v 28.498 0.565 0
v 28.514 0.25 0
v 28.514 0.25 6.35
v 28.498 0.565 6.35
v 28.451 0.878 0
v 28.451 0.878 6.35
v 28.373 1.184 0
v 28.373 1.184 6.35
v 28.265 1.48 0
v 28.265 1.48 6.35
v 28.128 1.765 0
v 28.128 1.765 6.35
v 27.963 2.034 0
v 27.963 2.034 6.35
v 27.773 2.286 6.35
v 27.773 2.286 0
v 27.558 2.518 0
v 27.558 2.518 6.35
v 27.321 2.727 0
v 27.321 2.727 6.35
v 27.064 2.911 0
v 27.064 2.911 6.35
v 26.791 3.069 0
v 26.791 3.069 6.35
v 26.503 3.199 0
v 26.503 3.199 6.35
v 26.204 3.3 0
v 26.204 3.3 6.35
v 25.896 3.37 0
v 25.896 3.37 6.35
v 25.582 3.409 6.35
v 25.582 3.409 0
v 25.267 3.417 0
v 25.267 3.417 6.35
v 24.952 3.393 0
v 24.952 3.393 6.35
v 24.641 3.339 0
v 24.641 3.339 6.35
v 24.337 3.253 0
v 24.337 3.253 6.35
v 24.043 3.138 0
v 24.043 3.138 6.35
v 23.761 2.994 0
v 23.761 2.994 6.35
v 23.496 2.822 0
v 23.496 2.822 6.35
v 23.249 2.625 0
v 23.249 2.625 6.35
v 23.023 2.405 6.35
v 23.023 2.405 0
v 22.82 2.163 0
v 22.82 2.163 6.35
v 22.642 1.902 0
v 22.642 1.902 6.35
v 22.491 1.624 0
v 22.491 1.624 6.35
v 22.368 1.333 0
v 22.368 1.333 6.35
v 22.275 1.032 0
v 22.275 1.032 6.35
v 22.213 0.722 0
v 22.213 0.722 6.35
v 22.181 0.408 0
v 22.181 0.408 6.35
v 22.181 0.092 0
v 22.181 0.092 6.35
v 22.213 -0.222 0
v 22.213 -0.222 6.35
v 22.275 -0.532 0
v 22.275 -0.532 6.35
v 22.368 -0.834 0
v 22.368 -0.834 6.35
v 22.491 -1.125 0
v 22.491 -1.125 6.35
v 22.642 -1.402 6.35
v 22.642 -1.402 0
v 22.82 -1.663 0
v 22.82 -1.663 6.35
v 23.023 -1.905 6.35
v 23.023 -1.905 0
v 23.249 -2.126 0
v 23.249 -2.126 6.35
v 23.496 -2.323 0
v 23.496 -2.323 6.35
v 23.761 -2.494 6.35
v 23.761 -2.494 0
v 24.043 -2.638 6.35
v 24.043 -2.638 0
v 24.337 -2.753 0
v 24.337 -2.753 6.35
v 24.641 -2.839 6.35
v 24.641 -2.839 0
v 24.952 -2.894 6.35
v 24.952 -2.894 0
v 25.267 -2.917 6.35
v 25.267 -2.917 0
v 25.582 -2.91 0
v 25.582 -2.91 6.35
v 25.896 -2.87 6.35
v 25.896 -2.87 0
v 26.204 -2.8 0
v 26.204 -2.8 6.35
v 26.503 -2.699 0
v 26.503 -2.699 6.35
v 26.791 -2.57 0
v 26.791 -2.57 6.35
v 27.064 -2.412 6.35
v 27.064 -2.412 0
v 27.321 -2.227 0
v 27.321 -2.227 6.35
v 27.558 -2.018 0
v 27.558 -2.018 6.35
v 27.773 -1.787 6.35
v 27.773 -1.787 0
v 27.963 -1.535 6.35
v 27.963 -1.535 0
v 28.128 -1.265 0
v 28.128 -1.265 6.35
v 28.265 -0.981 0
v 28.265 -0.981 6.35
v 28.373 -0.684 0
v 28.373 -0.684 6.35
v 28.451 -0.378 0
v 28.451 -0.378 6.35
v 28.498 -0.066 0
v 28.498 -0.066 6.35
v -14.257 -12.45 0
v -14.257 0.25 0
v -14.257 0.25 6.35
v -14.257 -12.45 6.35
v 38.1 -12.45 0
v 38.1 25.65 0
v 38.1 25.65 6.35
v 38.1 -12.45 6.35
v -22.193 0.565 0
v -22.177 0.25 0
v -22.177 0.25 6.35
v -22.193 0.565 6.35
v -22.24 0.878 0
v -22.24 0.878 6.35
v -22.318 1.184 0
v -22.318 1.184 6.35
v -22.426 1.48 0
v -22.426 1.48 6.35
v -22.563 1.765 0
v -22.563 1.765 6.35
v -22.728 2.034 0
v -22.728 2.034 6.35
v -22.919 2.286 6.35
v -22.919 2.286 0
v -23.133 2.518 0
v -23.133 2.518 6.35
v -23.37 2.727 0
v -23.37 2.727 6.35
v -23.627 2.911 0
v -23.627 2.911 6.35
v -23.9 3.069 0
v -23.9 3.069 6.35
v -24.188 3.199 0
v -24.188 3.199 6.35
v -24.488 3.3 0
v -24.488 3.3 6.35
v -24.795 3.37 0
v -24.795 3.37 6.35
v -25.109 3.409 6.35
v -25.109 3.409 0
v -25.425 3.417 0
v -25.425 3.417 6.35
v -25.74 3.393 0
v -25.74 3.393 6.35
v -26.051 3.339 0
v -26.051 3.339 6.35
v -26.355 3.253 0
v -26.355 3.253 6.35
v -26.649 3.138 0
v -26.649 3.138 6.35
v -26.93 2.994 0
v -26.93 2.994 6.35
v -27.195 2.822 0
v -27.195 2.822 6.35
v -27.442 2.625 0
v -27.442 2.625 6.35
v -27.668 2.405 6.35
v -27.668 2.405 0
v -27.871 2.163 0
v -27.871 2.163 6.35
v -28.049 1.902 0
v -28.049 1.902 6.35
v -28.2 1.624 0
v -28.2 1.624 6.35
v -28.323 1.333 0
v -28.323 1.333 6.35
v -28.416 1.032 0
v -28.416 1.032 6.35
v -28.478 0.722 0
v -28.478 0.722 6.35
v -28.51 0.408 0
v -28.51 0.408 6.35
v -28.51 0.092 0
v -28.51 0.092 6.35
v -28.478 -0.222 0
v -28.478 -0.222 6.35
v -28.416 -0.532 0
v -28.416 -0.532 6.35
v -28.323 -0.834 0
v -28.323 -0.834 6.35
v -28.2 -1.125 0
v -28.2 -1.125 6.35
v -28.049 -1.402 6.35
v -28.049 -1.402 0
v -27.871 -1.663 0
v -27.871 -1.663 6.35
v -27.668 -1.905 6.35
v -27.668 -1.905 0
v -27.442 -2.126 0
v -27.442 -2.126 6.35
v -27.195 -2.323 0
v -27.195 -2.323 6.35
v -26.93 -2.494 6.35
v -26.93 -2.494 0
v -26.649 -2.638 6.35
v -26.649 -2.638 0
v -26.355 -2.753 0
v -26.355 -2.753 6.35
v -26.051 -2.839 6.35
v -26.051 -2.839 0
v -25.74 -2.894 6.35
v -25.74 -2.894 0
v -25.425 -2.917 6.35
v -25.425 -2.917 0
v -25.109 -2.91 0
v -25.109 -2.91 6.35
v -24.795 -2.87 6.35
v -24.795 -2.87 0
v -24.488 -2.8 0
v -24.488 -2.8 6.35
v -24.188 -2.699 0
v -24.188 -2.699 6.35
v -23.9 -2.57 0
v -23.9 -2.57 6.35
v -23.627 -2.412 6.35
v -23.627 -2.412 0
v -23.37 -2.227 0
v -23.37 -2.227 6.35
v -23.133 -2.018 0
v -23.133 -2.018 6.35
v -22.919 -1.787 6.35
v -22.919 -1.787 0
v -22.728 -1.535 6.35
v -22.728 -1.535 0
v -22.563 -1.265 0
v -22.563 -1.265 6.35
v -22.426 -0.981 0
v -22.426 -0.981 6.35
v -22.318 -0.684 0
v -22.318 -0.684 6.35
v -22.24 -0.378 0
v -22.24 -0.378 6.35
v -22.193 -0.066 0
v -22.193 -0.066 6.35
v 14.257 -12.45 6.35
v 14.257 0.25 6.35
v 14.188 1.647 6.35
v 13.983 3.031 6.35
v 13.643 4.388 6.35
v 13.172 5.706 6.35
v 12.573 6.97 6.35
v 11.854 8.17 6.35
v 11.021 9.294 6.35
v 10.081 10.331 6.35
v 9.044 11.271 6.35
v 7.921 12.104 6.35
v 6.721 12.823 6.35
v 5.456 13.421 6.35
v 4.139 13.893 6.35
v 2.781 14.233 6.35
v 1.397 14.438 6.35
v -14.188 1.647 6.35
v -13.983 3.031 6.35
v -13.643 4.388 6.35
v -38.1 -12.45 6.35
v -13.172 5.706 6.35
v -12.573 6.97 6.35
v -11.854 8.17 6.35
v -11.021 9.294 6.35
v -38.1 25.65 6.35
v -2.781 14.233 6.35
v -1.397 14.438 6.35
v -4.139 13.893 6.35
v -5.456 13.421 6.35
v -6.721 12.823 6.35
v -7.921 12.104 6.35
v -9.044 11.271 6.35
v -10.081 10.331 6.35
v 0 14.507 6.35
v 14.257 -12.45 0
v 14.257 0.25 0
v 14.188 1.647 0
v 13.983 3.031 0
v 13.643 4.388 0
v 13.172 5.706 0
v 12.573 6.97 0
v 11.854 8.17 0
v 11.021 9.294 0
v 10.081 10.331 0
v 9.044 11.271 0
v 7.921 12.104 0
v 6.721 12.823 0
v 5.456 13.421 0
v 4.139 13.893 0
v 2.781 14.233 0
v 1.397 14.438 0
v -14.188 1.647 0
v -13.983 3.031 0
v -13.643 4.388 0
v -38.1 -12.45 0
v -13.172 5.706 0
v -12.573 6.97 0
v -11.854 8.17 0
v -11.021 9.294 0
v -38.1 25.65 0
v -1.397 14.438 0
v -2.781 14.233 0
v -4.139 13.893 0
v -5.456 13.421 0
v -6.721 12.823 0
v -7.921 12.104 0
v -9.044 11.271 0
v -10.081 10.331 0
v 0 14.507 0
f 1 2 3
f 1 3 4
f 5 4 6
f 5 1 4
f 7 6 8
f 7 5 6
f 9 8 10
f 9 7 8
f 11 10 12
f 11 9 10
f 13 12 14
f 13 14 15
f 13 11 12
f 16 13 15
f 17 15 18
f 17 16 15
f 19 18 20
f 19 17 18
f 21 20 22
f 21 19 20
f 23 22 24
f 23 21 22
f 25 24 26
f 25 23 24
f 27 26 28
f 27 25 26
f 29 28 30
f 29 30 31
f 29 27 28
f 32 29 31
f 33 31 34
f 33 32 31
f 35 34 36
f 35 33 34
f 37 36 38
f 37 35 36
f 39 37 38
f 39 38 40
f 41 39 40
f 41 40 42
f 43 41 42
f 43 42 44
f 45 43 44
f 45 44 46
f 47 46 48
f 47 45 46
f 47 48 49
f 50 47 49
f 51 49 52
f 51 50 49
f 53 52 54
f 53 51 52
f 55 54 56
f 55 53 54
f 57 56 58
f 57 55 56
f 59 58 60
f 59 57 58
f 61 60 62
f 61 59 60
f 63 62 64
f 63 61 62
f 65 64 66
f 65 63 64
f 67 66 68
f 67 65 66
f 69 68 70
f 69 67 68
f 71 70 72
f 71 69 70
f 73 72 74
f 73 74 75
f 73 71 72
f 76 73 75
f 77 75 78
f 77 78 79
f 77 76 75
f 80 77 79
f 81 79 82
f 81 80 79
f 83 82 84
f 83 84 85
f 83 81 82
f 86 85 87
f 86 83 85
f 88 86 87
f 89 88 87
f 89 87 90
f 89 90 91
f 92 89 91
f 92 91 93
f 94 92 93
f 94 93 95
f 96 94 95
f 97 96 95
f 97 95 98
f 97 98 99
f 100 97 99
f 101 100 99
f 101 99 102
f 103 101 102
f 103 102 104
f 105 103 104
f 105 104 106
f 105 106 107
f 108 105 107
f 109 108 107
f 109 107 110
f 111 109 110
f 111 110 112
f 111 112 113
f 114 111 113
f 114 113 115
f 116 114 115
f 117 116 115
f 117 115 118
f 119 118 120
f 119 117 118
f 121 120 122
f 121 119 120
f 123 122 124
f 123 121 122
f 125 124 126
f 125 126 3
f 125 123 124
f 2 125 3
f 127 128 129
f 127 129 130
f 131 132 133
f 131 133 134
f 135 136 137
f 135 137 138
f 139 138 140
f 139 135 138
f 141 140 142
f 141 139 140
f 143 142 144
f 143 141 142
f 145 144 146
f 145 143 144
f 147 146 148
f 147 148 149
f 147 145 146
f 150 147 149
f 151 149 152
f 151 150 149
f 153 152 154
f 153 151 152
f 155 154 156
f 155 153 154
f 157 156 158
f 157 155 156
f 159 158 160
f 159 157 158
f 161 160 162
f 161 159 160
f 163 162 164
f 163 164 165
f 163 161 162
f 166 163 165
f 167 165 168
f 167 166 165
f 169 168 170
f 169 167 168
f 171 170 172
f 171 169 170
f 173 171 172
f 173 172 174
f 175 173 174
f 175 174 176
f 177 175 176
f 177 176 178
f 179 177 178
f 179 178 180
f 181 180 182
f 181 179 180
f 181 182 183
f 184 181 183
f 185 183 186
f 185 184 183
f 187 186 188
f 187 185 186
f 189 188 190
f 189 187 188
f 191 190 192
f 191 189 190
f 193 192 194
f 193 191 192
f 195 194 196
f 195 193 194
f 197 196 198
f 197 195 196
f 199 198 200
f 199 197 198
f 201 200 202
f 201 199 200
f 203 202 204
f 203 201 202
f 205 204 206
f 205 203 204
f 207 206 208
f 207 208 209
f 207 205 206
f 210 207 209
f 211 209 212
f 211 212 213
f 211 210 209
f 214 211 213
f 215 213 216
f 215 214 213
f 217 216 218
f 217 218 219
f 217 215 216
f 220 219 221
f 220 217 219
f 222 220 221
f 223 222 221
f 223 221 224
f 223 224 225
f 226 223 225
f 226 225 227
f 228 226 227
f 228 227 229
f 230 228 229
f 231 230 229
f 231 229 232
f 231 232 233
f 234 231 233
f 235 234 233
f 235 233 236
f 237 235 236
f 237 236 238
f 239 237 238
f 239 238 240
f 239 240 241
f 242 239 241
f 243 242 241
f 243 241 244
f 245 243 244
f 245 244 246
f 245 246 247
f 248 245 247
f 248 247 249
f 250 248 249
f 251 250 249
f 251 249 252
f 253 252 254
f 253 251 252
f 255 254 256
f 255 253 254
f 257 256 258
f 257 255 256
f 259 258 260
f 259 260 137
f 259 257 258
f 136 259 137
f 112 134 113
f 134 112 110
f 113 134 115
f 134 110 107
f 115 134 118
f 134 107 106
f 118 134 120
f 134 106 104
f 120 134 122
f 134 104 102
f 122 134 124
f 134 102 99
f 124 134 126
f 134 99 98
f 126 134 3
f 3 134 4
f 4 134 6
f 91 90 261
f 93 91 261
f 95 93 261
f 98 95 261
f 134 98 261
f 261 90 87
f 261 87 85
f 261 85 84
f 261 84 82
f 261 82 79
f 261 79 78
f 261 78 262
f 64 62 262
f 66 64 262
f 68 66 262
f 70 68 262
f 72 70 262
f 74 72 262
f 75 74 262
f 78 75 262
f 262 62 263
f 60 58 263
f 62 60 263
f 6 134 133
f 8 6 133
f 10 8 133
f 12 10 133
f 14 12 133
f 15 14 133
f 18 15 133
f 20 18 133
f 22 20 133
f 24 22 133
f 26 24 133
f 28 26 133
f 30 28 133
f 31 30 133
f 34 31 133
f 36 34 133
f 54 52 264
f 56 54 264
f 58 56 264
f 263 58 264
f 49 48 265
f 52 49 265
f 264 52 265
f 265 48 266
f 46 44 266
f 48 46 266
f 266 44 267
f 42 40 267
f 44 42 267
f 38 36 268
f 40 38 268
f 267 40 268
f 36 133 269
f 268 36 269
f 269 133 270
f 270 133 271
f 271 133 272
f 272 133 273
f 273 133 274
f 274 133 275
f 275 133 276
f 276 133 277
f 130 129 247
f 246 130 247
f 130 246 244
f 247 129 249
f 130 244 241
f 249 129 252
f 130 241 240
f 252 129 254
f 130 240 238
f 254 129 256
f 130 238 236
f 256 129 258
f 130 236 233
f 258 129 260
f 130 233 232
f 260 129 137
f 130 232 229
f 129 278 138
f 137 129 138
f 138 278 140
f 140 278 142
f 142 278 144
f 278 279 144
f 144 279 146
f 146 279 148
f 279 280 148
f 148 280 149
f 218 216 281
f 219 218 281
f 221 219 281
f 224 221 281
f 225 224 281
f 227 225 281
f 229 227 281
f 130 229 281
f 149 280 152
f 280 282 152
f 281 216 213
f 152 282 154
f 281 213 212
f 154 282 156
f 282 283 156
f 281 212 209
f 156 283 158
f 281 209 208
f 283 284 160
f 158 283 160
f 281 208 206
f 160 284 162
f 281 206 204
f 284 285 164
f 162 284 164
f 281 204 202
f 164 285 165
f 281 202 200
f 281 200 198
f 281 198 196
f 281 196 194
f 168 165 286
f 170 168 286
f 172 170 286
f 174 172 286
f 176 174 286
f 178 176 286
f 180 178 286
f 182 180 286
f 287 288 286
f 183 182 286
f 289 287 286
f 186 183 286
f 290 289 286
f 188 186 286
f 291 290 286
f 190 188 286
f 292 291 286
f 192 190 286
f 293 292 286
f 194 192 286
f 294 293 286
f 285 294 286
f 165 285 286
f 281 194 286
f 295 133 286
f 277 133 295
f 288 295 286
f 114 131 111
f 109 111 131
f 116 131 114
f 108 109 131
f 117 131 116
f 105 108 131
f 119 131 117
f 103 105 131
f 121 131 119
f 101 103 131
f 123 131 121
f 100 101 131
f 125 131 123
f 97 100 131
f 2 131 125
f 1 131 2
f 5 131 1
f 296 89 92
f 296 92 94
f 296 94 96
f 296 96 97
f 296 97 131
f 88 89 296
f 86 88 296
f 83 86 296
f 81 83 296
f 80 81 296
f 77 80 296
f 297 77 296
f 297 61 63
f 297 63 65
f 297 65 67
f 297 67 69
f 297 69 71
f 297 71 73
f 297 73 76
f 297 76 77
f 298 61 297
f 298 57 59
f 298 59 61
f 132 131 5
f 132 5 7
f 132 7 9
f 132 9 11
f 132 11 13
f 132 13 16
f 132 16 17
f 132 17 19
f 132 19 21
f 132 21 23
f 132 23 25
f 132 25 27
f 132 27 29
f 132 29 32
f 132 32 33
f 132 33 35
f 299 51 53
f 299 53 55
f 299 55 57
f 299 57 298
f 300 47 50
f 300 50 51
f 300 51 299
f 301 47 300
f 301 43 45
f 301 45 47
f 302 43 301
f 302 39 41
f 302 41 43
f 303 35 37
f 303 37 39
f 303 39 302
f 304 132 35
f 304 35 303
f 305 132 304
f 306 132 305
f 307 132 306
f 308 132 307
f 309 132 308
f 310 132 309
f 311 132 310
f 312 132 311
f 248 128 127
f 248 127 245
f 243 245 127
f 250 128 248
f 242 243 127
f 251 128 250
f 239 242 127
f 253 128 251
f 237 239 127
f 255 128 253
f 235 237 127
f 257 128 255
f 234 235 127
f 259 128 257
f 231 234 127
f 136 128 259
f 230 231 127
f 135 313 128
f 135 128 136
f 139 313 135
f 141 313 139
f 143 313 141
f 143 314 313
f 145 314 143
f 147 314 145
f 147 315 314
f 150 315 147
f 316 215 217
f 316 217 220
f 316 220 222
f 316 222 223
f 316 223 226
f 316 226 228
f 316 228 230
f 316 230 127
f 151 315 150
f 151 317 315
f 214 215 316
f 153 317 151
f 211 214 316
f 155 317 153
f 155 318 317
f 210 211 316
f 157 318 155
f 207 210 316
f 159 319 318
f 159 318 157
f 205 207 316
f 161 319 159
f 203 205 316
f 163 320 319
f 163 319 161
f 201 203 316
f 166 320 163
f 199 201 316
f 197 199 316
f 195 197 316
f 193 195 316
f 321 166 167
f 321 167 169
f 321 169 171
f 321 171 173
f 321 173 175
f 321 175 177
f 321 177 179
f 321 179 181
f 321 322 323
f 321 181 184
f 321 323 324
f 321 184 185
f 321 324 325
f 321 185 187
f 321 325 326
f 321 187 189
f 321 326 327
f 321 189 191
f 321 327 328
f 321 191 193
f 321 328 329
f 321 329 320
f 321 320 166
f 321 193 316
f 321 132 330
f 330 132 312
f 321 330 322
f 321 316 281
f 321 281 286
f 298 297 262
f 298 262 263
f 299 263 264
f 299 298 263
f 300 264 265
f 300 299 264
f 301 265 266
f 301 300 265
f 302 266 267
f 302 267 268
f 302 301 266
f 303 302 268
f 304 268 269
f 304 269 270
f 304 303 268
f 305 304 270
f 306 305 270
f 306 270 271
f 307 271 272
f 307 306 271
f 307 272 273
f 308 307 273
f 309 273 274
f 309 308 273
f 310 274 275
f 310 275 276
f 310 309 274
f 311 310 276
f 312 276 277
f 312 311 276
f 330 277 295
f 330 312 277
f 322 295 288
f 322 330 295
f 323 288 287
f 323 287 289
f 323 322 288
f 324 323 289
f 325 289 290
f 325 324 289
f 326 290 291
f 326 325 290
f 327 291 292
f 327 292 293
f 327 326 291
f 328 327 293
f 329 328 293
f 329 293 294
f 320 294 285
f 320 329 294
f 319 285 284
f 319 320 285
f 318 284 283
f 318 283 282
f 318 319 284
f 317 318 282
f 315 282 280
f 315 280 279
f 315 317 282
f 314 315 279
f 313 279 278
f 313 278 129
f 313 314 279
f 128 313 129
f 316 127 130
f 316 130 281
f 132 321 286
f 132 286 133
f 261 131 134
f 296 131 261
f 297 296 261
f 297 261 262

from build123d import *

# Parameters (mm, degrees)
SKETCH1_R           = 3.168199077
BOSS_EXTRUDE1_DEPTH = 6.35


with BuildPart() as part:
    # Sketch1 → Boss-Extrude1 (new body)
    with BuildSketch(Plane.XY):
        with BuildLine():
            Line((-14.256895846, 0.249783871), (-14.256895846, -12.450216129))
            Line((-14.256895846, -12.450216129), (-38.1, -12.450216129))
            Line((-38.1, -12.450216129), (-38.1, 25.649783871))
            Line((-38.1, 25.649783871), (38.1, 25.649783871))
            Line((38.1, 25.649783871), (38.1, -12.450216129))
            Line((38.1, -12.450216129), (14.256895846, -12.450216129))
            Line((14.256895846, -12.450216129), (14.256895846, 0.249783871))
            ThreePointArc((14.256895846, 0.249783871), (0, 14.506679717), (-14.256895846, 0.249783871))
        make_face()
        with Locations((-25.345592616, 0.249783871)):
            Circle(SKETCH1_R, mode=Mode.SUBTRACT)
        with Locations((25.345592616, 0.249783871)):
            Circle(SKETCH1_R, mode=Mode.SUBTRACT)
    extrude(amount=BOSS_EXTRUDE1_DEPTH)


solid = part.part
